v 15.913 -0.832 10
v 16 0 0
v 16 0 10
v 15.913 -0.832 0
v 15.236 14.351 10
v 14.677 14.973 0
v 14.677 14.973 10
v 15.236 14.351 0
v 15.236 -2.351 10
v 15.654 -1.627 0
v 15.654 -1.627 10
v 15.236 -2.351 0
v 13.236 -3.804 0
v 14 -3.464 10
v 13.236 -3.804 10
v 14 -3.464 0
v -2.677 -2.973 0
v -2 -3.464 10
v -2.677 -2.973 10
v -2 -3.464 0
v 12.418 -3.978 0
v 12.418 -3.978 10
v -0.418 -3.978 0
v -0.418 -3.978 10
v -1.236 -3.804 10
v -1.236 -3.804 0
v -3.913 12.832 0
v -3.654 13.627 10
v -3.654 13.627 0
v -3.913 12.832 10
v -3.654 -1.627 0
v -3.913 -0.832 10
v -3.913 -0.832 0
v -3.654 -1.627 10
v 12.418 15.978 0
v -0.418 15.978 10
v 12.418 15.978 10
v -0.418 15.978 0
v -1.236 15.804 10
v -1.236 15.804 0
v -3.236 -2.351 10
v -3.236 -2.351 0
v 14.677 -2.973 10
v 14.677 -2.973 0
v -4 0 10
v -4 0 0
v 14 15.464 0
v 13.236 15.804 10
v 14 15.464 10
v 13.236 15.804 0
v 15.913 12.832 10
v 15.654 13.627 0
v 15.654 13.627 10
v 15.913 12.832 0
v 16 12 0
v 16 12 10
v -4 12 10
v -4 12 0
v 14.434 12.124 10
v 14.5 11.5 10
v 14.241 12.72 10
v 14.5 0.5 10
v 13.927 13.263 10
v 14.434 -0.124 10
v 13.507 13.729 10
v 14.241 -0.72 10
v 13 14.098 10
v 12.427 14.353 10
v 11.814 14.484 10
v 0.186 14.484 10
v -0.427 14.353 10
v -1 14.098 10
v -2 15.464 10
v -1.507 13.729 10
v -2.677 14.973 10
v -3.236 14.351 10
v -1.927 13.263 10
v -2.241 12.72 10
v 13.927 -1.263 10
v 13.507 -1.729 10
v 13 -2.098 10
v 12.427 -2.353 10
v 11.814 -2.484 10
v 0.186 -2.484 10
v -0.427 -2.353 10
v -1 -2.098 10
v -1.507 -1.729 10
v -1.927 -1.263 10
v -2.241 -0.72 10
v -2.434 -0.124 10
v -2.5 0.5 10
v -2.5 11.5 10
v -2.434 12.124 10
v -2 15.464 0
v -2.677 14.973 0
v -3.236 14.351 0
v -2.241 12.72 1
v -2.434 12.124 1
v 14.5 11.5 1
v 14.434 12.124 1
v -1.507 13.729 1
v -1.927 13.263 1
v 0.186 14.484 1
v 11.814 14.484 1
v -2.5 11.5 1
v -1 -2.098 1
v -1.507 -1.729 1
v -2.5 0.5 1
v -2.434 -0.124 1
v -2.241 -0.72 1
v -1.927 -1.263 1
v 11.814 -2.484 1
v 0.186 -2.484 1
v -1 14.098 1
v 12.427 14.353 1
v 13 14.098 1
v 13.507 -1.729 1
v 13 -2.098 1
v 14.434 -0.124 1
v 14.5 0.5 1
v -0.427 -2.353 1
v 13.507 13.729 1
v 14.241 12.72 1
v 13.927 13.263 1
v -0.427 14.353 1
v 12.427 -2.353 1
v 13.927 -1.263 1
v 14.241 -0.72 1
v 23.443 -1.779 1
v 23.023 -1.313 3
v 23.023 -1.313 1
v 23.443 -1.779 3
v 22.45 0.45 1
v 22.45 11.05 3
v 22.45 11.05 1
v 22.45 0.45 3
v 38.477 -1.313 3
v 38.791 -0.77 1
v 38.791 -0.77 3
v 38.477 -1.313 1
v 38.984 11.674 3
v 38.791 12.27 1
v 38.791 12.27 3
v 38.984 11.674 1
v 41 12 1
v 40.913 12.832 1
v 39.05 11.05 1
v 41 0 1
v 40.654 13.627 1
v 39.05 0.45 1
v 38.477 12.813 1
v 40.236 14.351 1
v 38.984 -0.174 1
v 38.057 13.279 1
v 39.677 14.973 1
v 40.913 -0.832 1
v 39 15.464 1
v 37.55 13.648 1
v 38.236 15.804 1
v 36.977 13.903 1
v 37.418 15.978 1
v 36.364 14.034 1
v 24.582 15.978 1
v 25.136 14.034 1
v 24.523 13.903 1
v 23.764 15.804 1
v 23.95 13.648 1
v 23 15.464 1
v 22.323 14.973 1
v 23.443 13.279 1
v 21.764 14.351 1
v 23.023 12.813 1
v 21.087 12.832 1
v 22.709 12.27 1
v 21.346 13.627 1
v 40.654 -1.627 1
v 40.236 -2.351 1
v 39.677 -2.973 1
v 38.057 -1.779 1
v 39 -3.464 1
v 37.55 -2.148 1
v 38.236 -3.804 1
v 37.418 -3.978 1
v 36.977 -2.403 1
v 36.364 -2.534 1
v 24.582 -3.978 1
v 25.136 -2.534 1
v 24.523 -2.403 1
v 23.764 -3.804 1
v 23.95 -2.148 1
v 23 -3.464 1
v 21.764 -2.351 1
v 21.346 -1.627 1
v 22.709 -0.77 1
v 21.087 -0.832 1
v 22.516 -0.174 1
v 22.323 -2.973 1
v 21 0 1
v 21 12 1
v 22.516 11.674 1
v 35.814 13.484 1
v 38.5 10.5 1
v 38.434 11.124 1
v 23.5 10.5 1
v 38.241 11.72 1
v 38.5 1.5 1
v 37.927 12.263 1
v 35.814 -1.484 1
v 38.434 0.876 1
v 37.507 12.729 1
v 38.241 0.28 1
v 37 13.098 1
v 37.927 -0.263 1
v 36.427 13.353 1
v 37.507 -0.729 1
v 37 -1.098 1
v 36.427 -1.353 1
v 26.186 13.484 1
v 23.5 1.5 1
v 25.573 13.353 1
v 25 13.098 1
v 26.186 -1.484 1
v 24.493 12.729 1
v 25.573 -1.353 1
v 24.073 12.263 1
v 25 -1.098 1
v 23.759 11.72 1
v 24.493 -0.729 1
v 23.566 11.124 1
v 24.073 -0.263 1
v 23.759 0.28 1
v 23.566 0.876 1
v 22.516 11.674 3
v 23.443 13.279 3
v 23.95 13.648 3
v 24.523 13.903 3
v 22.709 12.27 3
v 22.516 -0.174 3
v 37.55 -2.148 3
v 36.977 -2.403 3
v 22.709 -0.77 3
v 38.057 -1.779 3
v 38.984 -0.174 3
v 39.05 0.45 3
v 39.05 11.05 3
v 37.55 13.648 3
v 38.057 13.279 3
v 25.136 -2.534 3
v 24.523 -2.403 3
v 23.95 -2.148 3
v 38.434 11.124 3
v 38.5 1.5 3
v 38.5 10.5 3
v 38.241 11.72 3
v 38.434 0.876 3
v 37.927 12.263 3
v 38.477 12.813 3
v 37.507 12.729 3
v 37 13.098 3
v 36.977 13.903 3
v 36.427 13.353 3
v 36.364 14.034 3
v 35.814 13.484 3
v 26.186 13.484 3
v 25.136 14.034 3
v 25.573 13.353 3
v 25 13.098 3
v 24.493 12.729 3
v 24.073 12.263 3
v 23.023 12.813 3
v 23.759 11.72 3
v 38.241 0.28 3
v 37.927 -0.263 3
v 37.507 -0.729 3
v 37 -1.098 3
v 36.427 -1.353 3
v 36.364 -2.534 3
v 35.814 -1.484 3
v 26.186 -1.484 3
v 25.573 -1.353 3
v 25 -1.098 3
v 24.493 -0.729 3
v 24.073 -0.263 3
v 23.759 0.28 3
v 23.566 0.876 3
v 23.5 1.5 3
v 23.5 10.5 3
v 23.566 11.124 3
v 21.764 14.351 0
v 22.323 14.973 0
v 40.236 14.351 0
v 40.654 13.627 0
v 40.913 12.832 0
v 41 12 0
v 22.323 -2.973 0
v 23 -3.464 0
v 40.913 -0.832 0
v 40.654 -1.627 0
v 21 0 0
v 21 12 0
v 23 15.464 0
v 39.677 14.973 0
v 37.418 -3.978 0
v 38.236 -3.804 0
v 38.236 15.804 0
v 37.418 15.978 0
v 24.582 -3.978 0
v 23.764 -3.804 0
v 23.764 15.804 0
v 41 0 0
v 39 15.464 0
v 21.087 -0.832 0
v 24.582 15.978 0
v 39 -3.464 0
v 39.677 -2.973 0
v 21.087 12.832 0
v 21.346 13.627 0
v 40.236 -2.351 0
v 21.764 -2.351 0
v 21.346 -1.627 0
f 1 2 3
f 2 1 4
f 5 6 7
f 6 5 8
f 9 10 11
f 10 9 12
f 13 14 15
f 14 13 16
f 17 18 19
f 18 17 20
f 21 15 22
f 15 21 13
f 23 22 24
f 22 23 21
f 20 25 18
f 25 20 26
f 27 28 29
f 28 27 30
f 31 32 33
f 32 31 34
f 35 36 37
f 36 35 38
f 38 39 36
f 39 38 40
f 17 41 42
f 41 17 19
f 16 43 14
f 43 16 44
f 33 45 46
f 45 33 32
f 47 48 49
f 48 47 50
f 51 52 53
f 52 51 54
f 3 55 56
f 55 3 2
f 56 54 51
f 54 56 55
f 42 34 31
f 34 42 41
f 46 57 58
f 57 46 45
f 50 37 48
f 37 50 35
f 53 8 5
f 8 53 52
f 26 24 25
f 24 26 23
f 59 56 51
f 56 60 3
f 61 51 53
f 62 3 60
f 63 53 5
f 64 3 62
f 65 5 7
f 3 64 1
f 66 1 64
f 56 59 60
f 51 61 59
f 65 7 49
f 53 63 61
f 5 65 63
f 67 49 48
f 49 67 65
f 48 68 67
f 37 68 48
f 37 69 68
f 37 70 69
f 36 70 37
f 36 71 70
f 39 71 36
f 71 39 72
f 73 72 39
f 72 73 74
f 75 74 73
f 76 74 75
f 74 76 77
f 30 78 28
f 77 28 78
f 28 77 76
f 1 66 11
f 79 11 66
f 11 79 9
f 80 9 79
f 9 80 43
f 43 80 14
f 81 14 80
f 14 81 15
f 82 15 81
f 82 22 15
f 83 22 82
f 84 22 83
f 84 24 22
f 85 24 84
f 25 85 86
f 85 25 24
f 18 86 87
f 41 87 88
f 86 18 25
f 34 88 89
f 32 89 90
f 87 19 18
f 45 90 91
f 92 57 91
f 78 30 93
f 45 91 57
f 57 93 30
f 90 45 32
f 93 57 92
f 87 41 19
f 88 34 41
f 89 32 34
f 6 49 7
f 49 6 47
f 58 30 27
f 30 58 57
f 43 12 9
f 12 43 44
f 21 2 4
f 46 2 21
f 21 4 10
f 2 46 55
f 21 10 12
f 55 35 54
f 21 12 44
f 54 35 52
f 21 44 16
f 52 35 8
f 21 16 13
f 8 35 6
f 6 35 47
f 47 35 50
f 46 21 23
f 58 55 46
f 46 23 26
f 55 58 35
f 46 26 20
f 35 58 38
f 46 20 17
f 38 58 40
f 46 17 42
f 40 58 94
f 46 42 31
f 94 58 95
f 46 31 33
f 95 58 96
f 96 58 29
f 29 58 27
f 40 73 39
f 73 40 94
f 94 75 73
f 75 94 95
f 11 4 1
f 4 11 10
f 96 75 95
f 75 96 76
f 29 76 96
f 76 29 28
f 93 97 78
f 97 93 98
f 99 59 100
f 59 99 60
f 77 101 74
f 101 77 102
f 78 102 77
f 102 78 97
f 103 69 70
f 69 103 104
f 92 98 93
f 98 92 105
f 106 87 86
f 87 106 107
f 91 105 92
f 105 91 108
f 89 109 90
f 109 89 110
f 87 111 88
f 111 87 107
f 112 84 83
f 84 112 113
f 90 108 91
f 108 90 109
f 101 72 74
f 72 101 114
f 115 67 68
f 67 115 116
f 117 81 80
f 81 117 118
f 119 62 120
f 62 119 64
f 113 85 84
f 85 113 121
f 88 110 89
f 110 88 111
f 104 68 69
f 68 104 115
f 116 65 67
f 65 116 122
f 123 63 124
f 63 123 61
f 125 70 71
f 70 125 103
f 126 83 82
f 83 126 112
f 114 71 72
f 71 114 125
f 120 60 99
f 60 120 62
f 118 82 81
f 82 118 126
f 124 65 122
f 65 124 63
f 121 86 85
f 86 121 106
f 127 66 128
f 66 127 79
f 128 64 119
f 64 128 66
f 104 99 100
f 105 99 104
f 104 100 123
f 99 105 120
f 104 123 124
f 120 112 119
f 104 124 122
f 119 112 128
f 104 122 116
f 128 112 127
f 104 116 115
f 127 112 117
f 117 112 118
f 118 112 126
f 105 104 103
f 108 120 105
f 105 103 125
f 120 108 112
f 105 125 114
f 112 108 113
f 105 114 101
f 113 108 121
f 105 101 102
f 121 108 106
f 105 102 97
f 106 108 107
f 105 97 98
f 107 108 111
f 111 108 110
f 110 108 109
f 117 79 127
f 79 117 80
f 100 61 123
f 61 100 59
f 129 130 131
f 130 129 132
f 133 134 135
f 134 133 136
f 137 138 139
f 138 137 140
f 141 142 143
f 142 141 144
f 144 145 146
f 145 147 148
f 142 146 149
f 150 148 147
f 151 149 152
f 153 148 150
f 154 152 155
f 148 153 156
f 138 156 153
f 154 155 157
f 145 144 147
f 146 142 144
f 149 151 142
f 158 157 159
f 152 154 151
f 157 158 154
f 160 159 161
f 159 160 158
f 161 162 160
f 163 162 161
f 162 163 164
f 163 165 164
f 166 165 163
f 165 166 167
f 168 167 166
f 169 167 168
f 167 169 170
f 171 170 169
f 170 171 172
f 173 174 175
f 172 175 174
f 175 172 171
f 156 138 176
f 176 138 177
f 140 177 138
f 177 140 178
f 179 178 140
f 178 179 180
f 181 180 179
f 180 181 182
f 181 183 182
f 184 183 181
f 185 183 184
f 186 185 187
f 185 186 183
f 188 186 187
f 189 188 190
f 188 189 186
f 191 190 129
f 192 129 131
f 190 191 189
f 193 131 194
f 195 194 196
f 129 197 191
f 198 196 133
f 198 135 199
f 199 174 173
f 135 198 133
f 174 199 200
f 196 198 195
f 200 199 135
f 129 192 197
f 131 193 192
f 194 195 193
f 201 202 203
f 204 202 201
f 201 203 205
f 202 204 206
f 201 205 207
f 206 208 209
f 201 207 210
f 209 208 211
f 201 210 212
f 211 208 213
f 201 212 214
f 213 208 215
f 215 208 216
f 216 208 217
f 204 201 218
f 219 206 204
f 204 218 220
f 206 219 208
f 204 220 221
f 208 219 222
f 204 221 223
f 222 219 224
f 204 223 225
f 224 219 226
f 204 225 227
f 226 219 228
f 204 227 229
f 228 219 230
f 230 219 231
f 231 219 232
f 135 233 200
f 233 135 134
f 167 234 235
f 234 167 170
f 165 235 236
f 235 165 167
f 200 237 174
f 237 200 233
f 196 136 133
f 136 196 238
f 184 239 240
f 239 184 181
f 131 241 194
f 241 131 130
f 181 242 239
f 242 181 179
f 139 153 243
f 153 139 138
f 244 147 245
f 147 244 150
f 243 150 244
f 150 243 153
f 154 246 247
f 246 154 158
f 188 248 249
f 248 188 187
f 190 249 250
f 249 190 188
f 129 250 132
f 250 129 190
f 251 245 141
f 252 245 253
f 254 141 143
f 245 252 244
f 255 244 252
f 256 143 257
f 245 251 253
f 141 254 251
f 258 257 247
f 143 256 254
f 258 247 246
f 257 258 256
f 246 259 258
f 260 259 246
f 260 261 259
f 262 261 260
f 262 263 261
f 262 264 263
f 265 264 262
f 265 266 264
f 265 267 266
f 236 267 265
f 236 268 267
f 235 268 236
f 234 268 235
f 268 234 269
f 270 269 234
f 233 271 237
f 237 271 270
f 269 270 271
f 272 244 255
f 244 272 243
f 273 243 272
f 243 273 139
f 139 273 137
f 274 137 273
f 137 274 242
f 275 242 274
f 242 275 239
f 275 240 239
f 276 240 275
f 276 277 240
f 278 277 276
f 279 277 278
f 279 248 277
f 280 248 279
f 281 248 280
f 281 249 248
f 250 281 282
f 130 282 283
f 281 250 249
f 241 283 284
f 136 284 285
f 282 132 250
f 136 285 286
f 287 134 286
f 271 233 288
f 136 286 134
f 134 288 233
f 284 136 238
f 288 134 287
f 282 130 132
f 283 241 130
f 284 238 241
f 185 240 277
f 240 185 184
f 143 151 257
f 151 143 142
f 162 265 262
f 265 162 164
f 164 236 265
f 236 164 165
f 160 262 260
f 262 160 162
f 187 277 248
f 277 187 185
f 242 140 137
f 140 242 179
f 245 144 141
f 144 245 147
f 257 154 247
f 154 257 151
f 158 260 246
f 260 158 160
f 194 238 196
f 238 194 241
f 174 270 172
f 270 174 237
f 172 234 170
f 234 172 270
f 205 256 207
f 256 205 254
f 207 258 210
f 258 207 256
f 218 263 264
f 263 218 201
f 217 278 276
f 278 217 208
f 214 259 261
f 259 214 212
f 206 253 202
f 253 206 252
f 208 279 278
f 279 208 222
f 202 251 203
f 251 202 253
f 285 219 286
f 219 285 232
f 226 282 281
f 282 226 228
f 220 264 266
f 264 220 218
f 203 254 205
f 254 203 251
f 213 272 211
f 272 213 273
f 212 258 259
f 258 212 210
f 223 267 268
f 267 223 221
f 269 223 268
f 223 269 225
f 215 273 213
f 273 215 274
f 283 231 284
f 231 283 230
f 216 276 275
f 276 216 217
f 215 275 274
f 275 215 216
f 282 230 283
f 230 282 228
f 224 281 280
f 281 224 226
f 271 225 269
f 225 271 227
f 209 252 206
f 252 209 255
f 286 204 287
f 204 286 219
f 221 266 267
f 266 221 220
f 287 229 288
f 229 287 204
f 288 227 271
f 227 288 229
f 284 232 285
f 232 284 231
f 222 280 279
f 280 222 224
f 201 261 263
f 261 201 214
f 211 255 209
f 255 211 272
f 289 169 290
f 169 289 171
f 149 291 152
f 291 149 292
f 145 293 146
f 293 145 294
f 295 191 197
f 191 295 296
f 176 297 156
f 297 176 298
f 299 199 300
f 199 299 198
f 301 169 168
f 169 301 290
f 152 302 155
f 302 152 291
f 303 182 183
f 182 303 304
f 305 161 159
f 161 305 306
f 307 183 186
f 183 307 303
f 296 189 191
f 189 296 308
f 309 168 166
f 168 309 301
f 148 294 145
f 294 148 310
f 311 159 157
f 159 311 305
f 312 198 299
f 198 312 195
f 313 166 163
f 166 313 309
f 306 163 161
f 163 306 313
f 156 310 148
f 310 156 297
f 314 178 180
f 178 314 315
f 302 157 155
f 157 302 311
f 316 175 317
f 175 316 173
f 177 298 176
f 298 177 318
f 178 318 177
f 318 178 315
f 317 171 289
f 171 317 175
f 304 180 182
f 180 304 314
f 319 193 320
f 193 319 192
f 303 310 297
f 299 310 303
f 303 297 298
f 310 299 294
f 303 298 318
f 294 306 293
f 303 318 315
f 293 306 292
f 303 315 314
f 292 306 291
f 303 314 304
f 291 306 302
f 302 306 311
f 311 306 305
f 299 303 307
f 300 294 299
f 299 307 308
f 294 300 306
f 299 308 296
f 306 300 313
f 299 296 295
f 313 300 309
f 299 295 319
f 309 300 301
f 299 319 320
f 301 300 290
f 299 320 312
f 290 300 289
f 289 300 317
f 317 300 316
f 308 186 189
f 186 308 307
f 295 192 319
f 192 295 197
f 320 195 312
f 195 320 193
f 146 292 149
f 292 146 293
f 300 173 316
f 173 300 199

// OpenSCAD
// [FL_INDEX: keywords="openscad, 3d_parametric, Another_Customizable_Rounded_Corner_Box, csg_solid" | COT="Parametric OpenSCAD design from 3DCodeverse"]
// Title: Another Customizable Rounded Corner Box

// Another Customizable Rounded Corner box
// Hari Wiguna, Dec 2013

// Box Outer dimensions (in mmm)
Width = 20;
Depth = 20;
Height = 10;
Radius = 4;
WallThickness = 1;

// Lip at bottom of the lid that fits into the box
LipHeight = 2;

// Clearance between the lid lip and the box inside. Smaller = Tighter fit
Clearance = 0.2;

// Curve resolution (higher=smoother)
$fn=30;
Width2 = Width - WallThickness;
Depth2 = Depth - WallThickness;
Radius2 = Radius - WallThickness;
Height2 = Height - WallThickness;

Width3 = Width2 - 2*WallThickness;
Depth3 = Depth2 - 2*WallThickness;

Box();
translate([Width+5,0,0]) LidWithLip();

module LidWithLip()
{
	union()
	{
		Lid();
		LidLip();
	}
}

module Lid()
{
	minkowski()
	{
		cube([Width-2*Radius,Depth-2*Radius,WallThickness/2]);
		cylinder(WallThickness/2,Radius,Radius);
	}
}

module LidLip()
{
	difference()
	{
		translate([WallThickness/4+Clearance,WallThickness/4+Clearance,WallThickness])
		minkowski()
		{
			cube([Width2-2*Radius-2*Clearance, Depth2-2*Radius-2*Clearance, LipHeight/2]);
			cylinder(LipHeight/2, Radius2, Radius2);
		}

		translate([WallThickness*1.5,WallThickness*1.5,WallThickness])
		minkowski()
		{
			cube([Width3-2*Radius, Depth3-2*Radius, LipHeight/2]);
			cylinder(LipHeight/2, Radius2, Radius2);
		}
	}
}

module Box()
{
	difference()
	{
		OuterShell();
		InnerShell();
	}
}

module OuterShell()
{
	minkowski()
	{
		cube([Width-2*Radius,Depth-2*Radius,Height/2]);
		cylinder(Height/2,Radius,Radius);
	}
}


module InnerShell()
{
	translate([WallThickness/2,WallThickness/2,WallThickness])
	minkowski()
	{
		cube([Width2-(2*Radius), Depth2-(2*Radius), Height/2]);
		cylinder(Height2/2, Radius2, Radius2);
	}
}
